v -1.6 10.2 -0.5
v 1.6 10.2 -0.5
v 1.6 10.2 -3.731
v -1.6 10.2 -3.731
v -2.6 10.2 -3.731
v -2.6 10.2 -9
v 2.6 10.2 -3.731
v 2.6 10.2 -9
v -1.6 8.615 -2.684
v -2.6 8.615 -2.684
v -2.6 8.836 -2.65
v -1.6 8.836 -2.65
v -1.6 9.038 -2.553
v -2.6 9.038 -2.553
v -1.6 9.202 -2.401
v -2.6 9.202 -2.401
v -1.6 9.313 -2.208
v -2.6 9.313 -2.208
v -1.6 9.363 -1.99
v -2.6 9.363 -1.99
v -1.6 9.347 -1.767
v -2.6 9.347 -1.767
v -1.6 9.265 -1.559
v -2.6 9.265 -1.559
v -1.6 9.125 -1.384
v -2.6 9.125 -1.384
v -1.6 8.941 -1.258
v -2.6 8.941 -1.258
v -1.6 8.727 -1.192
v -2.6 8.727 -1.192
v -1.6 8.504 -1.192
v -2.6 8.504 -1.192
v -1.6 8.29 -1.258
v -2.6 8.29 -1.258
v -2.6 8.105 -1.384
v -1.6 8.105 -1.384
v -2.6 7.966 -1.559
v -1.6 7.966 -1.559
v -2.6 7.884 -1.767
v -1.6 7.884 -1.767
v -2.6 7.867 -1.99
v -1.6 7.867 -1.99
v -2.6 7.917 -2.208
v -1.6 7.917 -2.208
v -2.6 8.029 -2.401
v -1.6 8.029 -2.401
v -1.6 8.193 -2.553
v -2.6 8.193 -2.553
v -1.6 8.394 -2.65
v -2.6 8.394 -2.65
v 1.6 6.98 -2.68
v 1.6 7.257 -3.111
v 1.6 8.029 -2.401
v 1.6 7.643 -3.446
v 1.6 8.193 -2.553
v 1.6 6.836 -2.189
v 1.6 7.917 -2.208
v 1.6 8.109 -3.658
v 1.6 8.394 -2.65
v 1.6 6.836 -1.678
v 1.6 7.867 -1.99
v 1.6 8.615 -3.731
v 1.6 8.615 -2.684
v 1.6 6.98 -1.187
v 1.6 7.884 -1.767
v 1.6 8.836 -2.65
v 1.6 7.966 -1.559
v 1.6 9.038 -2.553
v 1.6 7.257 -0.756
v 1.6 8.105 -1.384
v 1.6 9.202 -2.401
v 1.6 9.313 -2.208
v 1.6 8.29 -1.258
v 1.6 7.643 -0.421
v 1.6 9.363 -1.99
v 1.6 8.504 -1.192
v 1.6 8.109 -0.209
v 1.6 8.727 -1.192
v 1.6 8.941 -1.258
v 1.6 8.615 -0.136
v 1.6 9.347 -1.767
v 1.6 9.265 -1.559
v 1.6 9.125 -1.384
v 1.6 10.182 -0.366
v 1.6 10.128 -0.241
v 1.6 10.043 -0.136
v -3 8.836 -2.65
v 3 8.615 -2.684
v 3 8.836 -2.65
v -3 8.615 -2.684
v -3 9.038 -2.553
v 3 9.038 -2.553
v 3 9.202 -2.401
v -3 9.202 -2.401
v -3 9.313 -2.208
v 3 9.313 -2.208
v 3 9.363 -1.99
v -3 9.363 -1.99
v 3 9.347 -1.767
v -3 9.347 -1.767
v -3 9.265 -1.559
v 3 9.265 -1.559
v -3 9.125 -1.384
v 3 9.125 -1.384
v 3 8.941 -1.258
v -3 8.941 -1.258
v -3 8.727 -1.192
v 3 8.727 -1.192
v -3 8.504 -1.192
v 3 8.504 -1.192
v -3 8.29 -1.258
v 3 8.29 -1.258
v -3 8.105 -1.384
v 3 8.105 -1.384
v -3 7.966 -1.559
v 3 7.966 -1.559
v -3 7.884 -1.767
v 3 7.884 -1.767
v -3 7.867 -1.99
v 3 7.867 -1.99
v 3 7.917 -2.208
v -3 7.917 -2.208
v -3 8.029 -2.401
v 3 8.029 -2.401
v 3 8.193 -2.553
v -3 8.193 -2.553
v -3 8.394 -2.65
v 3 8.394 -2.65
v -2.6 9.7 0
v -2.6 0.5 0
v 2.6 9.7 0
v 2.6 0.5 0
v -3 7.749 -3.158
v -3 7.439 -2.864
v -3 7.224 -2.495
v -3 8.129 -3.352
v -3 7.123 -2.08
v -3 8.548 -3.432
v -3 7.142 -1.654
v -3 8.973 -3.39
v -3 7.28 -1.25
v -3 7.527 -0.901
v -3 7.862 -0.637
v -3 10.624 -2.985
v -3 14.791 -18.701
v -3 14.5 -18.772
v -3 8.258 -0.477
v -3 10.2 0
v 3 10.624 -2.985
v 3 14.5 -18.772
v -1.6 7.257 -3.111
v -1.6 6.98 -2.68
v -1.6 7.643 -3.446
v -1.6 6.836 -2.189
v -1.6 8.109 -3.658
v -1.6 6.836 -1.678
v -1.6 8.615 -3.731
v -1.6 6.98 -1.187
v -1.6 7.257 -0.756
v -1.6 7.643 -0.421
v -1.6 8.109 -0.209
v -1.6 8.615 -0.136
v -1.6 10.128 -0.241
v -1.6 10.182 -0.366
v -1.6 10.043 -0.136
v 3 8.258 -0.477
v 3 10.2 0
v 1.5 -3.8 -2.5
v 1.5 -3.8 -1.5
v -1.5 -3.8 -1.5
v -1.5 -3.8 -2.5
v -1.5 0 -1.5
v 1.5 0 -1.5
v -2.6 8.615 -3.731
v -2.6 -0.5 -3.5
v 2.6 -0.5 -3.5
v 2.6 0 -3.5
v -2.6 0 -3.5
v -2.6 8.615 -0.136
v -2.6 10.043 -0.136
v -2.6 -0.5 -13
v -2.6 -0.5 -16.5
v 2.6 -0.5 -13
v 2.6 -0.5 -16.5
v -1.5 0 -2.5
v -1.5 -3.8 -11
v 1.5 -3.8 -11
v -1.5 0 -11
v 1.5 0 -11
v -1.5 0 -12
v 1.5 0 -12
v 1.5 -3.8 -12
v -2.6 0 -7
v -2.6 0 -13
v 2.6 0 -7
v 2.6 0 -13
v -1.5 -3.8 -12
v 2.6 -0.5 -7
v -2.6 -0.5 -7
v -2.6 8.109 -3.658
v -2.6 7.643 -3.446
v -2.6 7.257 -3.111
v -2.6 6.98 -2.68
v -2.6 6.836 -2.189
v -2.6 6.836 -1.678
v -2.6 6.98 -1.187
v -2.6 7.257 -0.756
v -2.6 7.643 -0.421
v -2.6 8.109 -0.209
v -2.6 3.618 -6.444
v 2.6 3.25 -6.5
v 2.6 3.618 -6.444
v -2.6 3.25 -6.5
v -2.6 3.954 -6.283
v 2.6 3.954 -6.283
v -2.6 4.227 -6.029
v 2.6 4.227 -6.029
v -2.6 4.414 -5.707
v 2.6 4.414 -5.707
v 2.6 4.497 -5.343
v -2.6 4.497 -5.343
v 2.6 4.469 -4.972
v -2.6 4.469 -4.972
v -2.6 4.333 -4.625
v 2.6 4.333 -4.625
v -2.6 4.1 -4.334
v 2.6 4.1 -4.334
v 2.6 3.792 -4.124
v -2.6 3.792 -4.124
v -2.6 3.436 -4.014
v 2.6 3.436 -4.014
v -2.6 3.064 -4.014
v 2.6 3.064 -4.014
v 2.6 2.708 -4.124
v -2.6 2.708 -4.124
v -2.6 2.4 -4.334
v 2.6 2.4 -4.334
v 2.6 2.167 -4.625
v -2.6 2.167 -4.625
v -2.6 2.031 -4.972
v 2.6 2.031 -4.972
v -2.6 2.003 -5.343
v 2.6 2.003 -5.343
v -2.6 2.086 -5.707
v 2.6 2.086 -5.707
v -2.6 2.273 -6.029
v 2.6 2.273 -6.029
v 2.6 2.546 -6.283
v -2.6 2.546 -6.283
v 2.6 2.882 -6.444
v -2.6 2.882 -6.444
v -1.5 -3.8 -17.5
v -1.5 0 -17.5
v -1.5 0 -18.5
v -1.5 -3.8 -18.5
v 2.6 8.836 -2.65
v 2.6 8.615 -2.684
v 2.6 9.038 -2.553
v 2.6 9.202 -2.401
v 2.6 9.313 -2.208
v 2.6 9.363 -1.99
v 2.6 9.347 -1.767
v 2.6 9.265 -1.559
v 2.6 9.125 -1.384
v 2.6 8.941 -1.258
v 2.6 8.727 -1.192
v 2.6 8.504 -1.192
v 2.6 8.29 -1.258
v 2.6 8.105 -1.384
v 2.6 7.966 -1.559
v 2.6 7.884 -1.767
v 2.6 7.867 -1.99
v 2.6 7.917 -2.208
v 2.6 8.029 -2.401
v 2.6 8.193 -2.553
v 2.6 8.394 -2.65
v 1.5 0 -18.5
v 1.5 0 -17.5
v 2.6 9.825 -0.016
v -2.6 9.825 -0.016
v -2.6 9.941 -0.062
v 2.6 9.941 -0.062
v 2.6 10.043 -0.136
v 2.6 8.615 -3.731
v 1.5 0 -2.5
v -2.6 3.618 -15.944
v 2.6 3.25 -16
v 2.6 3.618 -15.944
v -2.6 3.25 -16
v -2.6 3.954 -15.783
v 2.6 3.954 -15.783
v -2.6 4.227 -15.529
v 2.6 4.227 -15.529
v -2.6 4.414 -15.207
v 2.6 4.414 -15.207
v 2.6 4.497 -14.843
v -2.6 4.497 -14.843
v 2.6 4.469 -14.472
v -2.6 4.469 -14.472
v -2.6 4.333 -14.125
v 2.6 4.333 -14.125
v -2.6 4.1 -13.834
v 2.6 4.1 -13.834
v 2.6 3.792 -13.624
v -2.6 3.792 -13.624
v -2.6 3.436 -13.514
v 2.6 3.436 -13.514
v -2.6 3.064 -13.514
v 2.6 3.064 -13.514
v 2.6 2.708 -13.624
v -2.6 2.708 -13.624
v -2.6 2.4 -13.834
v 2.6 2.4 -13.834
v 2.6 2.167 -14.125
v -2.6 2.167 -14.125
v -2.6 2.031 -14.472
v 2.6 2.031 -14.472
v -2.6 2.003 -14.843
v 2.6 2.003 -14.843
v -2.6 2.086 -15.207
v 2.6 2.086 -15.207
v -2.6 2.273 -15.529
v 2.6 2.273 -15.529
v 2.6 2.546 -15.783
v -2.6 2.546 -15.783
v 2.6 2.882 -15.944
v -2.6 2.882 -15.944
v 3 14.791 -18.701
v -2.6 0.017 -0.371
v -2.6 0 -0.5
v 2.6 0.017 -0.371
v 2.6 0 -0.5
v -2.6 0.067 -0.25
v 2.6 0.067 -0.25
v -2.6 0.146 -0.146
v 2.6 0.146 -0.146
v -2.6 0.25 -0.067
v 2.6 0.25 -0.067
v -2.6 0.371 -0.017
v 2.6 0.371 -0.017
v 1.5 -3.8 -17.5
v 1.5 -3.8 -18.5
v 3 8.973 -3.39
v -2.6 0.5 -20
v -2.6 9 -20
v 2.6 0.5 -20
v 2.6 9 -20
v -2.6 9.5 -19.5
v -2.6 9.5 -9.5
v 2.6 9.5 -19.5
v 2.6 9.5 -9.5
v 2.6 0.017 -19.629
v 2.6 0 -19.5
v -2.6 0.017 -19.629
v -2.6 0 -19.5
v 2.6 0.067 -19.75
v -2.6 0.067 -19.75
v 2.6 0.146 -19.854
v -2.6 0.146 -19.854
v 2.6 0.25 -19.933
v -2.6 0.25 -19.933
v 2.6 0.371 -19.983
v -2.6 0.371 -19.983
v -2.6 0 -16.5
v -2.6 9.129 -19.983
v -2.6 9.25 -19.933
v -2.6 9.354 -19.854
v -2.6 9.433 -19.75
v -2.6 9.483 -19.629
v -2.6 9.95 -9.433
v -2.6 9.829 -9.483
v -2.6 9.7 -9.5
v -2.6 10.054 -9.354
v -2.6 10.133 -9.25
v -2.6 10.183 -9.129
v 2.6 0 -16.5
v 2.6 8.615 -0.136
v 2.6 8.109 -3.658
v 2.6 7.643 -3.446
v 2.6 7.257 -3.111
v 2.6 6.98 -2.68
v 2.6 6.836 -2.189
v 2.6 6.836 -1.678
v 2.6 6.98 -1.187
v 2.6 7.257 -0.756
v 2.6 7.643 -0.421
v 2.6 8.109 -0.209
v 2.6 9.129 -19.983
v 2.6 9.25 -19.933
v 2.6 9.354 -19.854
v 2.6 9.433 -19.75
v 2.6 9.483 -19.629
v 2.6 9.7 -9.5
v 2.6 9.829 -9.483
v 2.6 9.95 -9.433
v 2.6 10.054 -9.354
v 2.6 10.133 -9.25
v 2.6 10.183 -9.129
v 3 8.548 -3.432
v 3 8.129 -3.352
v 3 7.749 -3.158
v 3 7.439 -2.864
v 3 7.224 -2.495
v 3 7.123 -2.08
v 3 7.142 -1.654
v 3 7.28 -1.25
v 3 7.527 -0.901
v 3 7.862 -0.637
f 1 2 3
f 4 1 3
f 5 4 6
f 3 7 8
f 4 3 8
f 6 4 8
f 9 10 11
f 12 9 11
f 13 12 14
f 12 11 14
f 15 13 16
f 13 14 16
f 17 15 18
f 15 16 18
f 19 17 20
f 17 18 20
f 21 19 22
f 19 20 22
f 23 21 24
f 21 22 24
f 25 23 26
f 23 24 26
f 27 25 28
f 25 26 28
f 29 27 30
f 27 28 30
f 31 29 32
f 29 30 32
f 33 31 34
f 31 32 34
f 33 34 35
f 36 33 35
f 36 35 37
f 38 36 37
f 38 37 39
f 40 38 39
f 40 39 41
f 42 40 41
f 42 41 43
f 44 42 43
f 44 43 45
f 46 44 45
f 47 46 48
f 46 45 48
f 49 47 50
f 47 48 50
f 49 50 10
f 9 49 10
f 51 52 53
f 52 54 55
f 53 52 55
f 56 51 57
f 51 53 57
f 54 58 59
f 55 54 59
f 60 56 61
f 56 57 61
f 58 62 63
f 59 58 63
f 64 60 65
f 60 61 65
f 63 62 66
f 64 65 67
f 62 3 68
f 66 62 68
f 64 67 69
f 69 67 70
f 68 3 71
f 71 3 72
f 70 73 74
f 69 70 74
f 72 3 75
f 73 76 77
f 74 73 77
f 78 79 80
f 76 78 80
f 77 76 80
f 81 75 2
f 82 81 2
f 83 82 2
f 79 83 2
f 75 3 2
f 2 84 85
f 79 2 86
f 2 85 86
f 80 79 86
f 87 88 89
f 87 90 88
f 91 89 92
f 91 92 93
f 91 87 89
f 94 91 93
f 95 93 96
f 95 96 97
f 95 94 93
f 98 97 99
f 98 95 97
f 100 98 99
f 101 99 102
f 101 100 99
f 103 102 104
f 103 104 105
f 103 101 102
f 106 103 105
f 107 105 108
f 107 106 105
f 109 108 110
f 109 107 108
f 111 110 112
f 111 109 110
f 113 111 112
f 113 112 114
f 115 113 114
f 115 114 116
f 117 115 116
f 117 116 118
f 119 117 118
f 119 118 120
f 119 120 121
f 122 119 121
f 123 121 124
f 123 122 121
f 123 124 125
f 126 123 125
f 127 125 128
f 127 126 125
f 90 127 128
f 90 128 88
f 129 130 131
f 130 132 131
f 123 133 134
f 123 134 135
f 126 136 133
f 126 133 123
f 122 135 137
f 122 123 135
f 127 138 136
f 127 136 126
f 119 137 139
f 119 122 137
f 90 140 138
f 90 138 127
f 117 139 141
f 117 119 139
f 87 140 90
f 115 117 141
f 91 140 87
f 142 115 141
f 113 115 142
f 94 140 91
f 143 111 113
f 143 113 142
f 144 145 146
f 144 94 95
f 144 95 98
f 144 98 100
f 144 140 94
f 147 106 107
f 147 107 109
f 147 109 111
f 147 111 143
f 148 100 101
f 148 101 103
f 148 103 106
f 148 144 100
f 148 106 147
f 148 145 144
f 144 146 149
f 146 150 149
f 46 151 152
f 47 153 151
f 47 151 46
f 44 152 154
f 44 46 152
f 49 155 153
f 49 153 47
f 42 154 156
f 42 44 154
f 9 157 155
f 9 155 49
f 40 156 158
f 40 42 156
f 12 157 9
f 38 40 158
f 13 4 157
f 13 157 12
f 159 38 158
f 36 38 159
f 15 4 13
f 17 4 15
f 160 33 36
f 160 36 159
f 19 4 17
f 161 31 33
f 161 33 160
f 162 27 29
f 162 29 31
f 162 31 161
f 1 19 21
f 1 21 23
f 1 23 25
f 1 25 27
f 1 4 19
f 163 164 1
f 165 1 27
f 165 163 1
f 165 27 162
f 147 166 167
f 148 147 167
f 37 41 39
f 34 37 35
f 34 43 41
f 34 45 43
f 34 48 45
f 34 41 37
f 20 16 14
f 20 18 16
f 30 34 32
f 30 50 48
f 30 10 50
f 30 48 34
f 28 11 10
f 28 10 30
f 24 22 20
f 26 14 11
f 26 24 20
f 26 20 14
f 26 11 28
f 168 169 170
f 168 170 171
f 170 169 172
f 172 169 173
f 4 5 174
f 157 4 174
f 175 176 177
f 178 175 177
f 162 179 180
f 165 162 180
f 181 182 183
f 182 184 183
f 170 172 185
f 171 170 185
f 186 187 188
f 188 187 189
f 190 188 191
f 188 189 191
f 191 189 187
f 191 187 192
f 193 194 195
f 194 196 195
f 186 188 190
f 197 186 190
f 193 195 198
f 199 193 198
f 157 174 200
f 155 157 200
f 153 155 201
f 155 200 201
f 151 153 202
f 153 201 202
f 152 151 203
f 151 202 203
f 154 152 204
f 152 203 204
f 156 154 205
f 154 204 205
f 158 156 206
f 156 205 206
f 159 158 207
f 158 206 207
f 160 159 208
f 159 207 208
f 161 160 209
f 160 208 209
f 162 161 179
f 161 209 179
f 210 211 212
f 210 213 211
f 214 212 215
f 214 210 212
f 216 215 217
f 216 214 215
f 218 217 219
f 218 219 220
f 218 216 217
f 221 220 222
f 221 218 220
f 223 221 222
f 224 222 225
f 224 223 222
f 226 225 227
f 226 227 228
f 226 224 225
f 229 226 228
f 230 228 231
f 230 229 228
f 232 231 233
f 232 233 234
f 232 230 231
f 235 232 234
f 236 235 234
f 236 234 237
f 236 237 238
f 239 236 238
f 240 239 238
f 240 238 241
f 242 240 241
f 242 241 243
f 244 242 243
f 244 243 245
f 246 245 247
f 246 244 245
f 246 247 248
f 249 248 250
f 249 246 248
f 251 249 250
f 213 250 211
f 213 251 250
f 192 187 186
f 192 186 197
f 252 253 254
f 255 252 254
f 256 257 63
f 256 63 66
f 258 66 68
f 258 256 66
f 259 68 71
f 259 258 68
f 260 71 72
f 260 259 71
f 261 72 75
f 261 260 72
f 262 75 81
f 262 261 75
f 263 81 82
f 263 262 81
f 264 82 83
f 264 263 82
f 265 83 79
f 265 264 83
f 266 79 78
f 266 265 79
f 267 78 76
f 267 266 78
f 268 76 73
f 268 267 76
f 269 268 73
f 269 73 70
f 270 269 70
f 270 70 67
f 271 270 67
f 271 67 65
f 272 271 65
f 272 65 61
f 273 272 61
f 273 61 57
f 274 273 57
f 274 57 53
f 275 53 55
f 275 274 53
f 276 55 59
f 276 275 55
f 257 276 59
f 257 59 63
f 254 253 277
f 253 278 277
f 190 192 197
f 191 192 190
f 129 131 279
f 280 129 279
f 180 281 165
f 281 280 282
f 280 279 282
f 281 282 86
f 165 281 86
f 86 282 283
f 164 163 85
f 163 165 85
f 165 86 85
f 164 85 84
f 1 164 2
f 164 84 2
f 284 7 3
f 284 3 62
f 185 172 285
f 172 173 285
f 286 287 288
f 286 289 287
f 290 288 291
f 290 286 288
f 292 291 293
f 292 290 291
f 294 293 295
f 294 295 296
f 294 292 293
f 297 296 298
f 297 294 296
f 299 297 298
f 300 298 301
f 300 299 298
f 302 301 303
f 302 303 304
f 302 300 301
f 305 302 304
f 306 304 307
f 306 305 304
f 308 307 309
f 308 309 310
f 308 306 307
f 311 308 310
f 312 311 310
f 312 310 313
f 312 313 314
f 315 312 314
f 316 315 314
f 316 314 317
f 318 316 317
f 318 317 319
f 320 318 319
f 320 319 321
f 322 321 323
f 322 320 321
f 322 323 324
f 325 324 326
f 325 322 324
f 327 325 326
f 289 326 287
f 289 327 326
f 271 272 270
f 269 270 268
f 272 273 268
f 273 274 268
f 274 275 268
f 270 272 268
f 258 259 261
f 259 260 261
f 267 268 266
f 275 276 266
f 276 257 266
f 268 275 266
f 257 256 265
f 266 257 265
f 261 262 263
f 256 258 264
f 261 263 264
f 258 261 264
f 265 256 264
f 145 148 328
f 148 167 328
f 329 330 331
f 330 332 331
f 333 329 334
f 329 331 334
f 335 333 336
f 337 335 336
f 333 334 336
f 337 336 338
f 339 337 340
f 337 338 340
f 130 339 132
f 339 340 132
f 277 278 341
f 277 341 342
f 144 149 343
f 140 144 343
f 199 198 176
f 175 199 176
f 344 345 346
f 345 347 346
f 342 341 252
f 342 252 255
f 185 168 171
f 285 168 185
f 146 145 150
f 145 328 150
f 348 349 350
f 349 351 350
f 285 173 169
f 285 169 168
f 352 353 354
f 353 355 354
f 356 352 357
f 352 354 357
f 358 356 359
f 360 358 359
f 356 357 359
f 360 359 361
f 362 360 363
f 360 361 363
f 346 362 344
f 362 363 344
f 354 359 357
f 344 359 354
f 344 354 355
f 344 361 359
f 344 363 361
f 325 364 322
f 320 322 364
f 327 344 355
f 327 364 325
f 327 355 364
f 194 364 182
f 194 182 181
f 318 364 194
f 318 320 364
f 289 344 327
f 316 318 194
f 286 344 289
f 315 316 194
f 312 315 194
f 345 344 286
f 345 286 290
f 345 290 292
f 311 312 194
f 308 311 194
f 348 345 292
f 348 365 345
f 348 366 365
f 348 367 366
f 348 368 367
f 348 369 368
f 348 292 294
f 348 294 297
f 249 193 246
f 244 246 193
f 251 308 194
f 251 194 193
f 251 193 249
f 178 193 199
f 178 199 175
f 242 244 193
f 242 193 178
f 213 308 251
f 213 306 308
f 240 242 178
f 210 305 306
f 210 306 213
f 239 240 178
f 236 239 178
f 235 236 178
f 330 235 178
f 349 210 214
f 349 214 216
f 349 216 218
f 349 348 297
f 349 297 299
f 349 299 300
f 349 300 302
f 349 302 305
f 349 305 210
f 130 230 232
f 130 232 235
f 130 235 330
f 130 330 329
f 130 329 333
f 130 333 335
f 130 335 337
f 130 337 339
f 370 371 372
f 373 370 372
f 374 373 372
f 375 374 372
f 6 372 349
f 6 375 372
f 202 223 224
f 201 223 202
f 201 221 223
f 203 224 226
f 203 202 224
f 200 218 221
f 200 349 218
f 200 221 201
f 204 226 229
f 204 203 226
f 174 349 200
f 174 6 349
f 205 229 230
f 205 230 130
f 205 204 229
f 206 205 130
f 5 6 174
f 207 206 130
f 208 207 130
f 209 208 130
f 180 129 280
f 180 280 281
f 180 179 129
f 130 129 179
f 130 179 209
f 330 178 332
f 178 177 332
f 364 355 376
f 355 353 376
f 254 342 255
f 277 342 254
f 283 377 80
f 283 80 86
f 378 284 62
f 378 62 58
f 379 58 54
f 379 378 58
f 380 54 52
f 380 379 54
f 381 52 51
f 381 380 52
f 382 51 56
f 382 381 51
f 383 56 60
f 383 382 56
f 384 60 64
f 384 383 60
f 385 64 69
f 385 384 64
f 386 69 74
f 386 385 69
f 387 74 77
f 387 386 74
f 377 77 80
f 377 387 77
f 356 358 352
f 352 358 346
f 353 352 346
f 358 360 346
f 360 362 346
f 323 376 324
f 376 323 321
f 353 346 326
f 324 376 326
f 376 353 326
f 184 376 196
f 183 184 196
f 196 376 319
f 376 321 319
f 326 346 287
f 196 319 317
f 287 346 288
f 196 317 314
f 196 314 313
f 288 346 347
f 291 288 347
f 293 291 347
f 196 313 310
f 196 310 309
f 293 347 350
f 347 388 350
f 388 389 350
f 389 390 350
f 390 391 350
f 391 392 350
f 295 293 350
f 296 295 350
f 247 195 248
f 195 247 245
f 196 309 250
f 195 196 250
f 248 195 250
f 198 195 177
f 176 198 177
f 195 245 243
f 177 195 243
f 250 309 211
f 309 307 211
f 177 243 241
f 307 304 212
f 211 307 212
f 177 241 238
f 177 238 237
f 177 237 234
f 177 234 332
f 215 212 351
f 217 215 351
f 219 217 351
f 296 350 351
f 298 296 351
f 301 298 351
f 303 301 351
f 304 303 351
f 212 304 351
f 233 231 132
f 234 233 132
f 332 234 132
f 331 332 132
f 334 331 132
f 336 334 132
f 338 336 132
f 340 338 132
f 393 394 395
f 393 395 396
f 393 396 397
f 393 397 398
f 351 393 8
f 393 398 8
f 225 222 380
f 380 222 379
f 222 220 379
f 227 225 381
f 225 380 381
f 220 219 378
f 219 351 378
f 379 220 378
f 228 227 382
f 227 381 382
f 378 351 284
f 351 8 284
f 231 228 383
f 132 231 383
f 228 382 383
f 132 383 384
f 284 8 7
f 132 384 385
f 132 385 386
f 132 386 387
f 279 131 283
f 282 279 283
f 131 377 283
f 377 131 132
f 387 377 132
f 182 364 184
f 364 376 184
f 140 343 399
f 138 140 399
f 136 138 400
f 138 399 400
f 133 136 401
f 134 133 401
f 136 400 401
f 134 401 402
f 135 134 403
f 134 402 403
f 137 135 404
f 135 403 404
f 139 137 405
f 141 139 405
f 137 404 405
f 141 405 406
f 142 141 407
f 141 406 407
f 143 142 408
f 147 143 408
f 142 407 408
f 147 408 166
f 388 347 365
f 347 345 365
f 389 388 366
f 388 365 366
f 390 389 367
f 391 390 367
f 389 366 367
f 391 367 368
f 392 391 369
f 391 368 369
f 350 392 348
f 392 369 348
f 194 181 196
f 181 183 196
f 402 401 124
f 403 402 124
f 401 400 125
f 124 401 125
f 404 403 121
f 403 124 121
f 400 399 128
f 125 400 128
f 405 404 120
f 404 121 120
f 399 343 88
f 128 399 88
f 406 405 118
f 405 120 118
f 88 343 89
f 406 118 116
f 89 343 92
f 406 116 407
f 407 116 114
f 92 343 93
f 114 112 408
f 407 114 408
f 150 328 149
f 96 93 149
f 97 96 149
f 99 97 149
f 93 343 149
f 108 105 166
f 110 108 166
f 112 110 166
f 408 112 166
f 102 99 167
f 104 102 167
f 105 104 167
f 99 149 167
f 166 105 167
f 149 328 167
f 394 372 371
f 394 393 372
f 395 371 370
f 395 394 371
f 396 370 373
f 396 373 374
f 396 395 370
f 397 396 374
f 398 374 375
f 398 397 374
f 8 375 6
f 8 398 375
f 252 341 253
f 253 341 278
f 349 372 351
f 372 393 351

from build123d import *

# Parameters (mm, degrees)
SKETCH1_R             = 1.25
BOSS_EXTRUDE1_DEPTH   = 2.6
SKETCH2_W             = 1
SKETCH2_H             = 3.8
BOSS_EXTRUDE2_DEPTH   = 1.5
BOSS_EXTRUDE2_2_DEPTH = 1.5
BOSS_EXTRUDE2_3_DEPTH = 1.5
FILLET1_R             = 0.5
SKETCH3_R             = 0.75
BOSS_EXTRUDE3_DEPTH   = 3
SKETCH4_R             = 0.75
CUT_EXTRUDE1_DEPTH    = 1


with BuildPart() as part:
    # Sketch1 → Boss-Extrude1 (new, symmetric)
    with BuildSketch(Plane(origin=(0, 0, 0), x_dir=(0, 0, -1), z_dir=(1, 0, 0))):
        Polygon((9.5, 10.2), (9.5, 9.5), (20, 9.5), (20, 0), (16.5, 0), (16.5, -0.5), (13, -0.5), (13, 0), (7, 0), (7, -0.5), (3.5, -0.5), (3.5, 0), (0, 0), (0, 10.2), align=None)
        with Locations((5.25, 3.25)):
            Circle(SKETCH1_R, mode=Mode.SUBTRACT)
        with Locations((14.75, 3.25)):
            Circle(SKETCH1_R, mode=Mode.SUBTRACT)
    extrude(amount=BOSS_EXTRUDE1_DEPTH, both=True)

    # Fillet1
    fillet1_edges = [part.edges().sort_by_distance(p)[0] for p in [
        (0, 10.2, 0),
        (0, 10.2, -9.5),
        (0, 9.5, -20),
        (0, 0, -20),
        (0, 0, 0),
    ]]
    fillet(fillet1_edges, radius=FILLET1_R)

    # Sketch4 → Cut-Extrude1 (cut)
    with BuildSketch(Plane(origin=(2.6, 0, 0), x_dir=(0, 0, -1), z_dir=(1, 0, 0))):
        with BuildLine():
            Line((0.136036049, 8.615333379), (0.136036049, 12.621305862))
            ThreePointArc((0.136036049, 12.621305862), (1.93360588, 14.418875693), (3.731175711, 12.621305862))
            Line((3.731175711, 12.621305862), (3.731175711, 8.615333379))
            ThreePointArc((3.731175711, 8.615333379), (1.93360588, 6.817763548), (0.136036049, 8.615333379))
        make_face()
        with Locations((1.93360588, 8.615333379)):
            Circle(SKETCH4_R, mode=Mode.SUBTRACT)
    cut_extrude1 = extrude(amount=-CUT_EXTRUDE1_DEPTH, mode=Mode.SUBTRACT)

    # Mirror2: Cut-Extrude1 across plane
    add(cut_extrude1.mirror(Plane(origin=(0, 0, 0), x_dir=(0, 0, 1), z_dir=(1, 0, 0))), mode=Mode.SUBTRACT)


with BuildPart() as body_2:
    # Sketch2 → Boss-Extrude2 (new, symmetric)
    with BuildSketch(Plane(origin=(0, 0, 0), x_dir=(0, 0, -1), z_dir=(1, 0, 0))):
        with Locations((2, -1.9)):
            Rectangle(SKETCH2_W, SKETCH2_H)
    extrude(amount=BOSS_EXTRUDE2_DEPTH, both=True)


with BuildPart() as body_3:
    # Sketch2 → Boss-Extrude2 2 (new, symmetric)
    with BuildSketch(Plane(origin=(0, 0, 0), x_dir=(0, 0, -1), z_dir=(1, 0, 0))):
        with Locations((11.5, -1.9)):
            Rectangle(SKETCH2_W, SKETCH2_H)
    extrude(amount=BOSS_EXTRUDE2_2_DEPTH, both=True)


with BuildPart() as body_4:
    # Sketch2 → Boss-Extrude2 3 (new, symmetric)
    with BuildSketch(Plane(origin=(0, 0, 0), x_dir=(0, 0, -1), z_dir=(1, 0, 0))):
        with Locations((18, -1.9)):
            Rectangle(SKETCH2_W, SKETCH2_H)
    extrude(amount=BOSS_EXTRUDE2_3_DEPTH, both=True)


with BuildPart() as body_5:
    # Sketch3 → Boss-Extrude3 (new, symmetric)
    with BuildSketch(Plane(origin=(0, 0, 0), x_dir=(0, 0, -1), z_dir=(1, 0, 0))):
        with BuildLine():
            Line((0.476867785, 8.25768254), (0, 10.2))
            Line((0, 10.2), (18.700895569, 14.791347619))
            Line((18.700895569, 14.791347619), (18.772425737, 14.5))
            Line((18.772425737, 14.5), (2.985006358, 10.623954058))
            Line((2.985006358, 10.623954058), (3.390343975, 8.972984217))
            ThreePointArc((3.390343975, 8.972984217), (2.291256719, 7.158595284), (0.476867785, 8.25768254))
        make_face()
        with Locations((1.93360588, 8.615333379)):
            Circle(SKETCH3_R, mode=Mode.SUBTRACT)
    extrude(amount=BOSS_EXTRUDE3_DEPTH, both=True)


solid = Compound([part.part, body_2.part, body_3.part, body_4.part, body_5.part])
